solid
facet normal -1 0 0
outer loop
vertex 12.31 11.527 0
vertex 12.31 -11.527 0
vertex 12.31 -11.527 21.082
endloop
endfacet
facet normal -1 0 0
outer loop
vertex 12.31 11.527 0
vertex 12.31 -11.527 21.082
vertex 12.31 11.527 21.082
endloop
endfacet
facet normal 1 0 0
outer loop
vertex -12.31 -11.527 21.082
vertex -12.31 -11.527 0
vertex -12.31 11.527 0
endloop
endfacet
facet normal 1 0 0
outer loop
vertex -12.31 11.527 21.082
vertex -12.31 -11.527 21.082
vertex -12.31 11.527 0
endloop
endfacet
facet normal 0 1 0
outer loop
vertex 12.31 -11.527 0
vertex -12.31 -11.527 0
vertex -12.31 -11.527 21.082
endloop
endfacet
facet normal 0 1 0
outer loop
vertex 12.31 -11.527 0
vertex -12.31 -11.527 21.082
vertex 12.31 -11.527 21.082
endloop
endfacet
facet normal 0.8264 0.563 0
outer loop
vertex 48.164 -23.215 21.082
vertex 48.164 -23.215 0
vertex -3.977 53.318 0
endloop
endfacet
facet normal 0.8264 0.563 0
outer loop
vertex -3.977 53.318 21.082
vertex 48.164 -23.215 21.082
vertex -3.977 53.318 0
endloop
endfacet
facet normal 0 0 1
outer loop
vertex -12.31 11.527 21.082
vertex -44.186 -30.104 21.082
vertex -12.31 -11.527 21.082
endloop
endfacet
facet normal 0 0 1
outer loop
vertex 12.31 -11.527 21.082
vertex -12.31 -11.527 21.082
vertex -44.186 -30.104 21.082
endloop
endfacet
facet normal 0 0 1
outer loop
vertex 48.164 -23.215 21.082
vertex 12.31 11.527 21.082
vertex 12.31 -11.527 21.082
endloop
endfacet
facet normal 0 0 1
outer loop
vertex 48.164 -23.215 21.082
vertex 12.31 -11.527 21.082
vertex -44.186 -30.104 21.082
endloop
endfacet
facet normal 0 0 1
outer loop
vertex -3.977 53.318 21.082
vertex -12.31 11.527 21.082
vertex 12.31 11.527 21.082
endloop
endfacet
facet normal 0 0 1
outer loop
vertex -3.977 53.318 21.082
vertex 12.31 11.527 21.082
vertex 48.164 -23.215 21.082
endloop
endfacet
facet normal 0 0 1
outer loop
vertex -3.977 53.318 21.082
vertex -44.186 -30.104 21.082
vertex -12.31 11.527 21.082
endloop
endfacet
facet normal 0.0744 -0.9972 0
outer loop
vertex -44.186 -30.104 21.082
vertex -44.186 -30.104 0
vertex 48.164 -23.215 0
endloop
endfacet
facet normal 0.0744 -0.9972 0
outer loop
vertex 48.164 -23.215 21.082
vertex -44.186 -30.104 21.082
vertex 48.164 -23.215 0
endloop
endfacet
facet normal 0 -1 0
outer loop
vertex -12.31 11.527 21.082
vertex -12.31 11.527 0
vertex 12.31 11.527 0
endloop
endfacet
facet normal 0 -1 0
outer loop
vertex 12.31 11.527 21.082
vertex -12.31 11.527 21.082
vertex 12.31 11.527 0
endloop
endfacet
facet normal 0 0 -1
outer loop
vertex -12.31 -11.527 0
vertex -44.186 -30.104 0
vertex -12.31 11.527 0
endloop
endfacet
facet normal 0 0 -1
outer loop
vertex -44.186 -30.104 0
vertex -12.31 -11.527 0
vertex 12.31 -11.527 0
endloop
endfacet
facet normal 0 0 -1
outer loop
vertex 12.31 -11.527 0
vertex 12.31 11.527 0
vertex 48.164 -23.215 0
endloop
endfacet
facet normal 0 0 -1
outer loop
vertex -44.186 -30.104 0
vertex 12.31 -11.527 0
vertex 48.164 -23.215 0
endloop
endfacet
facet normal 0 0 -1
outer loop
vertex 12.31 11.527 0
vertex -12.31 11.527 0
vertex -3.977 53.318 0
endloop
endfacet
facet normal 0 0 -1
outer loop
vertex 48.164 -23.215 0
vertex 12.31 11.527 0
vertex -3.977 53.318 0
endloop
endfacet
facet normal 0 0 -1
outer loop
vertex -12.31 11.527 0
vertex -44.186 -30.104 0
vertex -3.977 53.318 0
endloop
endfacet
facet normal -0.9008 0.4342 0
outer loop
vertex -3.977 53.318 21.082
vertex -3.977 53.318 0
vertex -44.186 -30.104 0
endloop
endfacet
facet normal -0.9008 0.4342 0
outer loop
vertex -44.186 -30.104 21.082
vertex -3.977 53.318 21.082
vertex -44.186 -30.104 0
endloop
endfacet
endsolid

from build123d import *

# Parameters (mm, degrees)
F0_W     = 24.619864
F0_H     = 23.054572
F1_DEPTH = 21.082


with BuildPart() as f1:
    # F0 (on Top) → F1 (new body)
    with BuildSketch(Plane.XY):
        Polygon((-3.977364, 53.318289), (-44.18631, -30.103643), (48.163675, -23.214646), align=None)
        Rectangle(F0_W, F0_H, mode=Mode.SUBTRACT)
    extrude(amount=F1_DEPTH)


solid = f1.part
